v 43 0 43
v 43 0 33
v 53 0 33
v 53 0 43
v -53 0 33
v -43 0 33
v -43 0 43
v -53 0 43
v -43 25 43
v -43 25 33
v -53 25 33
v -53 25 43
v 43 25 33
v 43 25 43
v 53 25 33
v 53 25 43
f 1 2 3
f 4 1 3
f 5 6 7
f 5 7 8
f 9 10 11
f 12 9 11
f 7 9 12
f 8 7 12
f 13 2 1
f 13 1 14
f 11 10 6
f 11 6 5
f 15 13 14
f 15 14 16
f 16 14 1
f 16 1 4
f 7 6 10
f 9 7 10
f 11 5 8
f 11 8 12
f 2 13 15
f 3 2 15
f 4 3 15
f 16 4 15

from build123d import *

# Parameters (mm, degrees)
BOX021_W     = 10
BOX021_H     = 25
BOX021_DEPTH = 10


with BuildPart() as agujeros_new:
    # Box021 → Box021 (new body)
    with BuildSketch(Plane(origin=(43, 0, 33), x_dir=(1, 0, 0), z_dir=(0, 0, 1))):
        with Locations((5, 12.5)):
            Rectangle(BOX021_W, BOX021_H)
    extrude(amount=BOX021_DEPTH)


with BuildPart() as part_mirroring027:
    # Part__Mirroring027: instance of agujeros-new
    add(agujeros_new.part.mirror(Plane(origin=(0, 0, 0), x_dir=(0, -1, 0), z_dir=(1, 0, 0))))


with BuildPart() as agujeros_rectangulares:
    # Fusion001054 base: copy of agujeros-new
    add(agujeros_new.part)

    # Fusion001054: union Part__Mirroring027
    add(part_mirroring027.part)


solid = agujeros_rectangulares.part
